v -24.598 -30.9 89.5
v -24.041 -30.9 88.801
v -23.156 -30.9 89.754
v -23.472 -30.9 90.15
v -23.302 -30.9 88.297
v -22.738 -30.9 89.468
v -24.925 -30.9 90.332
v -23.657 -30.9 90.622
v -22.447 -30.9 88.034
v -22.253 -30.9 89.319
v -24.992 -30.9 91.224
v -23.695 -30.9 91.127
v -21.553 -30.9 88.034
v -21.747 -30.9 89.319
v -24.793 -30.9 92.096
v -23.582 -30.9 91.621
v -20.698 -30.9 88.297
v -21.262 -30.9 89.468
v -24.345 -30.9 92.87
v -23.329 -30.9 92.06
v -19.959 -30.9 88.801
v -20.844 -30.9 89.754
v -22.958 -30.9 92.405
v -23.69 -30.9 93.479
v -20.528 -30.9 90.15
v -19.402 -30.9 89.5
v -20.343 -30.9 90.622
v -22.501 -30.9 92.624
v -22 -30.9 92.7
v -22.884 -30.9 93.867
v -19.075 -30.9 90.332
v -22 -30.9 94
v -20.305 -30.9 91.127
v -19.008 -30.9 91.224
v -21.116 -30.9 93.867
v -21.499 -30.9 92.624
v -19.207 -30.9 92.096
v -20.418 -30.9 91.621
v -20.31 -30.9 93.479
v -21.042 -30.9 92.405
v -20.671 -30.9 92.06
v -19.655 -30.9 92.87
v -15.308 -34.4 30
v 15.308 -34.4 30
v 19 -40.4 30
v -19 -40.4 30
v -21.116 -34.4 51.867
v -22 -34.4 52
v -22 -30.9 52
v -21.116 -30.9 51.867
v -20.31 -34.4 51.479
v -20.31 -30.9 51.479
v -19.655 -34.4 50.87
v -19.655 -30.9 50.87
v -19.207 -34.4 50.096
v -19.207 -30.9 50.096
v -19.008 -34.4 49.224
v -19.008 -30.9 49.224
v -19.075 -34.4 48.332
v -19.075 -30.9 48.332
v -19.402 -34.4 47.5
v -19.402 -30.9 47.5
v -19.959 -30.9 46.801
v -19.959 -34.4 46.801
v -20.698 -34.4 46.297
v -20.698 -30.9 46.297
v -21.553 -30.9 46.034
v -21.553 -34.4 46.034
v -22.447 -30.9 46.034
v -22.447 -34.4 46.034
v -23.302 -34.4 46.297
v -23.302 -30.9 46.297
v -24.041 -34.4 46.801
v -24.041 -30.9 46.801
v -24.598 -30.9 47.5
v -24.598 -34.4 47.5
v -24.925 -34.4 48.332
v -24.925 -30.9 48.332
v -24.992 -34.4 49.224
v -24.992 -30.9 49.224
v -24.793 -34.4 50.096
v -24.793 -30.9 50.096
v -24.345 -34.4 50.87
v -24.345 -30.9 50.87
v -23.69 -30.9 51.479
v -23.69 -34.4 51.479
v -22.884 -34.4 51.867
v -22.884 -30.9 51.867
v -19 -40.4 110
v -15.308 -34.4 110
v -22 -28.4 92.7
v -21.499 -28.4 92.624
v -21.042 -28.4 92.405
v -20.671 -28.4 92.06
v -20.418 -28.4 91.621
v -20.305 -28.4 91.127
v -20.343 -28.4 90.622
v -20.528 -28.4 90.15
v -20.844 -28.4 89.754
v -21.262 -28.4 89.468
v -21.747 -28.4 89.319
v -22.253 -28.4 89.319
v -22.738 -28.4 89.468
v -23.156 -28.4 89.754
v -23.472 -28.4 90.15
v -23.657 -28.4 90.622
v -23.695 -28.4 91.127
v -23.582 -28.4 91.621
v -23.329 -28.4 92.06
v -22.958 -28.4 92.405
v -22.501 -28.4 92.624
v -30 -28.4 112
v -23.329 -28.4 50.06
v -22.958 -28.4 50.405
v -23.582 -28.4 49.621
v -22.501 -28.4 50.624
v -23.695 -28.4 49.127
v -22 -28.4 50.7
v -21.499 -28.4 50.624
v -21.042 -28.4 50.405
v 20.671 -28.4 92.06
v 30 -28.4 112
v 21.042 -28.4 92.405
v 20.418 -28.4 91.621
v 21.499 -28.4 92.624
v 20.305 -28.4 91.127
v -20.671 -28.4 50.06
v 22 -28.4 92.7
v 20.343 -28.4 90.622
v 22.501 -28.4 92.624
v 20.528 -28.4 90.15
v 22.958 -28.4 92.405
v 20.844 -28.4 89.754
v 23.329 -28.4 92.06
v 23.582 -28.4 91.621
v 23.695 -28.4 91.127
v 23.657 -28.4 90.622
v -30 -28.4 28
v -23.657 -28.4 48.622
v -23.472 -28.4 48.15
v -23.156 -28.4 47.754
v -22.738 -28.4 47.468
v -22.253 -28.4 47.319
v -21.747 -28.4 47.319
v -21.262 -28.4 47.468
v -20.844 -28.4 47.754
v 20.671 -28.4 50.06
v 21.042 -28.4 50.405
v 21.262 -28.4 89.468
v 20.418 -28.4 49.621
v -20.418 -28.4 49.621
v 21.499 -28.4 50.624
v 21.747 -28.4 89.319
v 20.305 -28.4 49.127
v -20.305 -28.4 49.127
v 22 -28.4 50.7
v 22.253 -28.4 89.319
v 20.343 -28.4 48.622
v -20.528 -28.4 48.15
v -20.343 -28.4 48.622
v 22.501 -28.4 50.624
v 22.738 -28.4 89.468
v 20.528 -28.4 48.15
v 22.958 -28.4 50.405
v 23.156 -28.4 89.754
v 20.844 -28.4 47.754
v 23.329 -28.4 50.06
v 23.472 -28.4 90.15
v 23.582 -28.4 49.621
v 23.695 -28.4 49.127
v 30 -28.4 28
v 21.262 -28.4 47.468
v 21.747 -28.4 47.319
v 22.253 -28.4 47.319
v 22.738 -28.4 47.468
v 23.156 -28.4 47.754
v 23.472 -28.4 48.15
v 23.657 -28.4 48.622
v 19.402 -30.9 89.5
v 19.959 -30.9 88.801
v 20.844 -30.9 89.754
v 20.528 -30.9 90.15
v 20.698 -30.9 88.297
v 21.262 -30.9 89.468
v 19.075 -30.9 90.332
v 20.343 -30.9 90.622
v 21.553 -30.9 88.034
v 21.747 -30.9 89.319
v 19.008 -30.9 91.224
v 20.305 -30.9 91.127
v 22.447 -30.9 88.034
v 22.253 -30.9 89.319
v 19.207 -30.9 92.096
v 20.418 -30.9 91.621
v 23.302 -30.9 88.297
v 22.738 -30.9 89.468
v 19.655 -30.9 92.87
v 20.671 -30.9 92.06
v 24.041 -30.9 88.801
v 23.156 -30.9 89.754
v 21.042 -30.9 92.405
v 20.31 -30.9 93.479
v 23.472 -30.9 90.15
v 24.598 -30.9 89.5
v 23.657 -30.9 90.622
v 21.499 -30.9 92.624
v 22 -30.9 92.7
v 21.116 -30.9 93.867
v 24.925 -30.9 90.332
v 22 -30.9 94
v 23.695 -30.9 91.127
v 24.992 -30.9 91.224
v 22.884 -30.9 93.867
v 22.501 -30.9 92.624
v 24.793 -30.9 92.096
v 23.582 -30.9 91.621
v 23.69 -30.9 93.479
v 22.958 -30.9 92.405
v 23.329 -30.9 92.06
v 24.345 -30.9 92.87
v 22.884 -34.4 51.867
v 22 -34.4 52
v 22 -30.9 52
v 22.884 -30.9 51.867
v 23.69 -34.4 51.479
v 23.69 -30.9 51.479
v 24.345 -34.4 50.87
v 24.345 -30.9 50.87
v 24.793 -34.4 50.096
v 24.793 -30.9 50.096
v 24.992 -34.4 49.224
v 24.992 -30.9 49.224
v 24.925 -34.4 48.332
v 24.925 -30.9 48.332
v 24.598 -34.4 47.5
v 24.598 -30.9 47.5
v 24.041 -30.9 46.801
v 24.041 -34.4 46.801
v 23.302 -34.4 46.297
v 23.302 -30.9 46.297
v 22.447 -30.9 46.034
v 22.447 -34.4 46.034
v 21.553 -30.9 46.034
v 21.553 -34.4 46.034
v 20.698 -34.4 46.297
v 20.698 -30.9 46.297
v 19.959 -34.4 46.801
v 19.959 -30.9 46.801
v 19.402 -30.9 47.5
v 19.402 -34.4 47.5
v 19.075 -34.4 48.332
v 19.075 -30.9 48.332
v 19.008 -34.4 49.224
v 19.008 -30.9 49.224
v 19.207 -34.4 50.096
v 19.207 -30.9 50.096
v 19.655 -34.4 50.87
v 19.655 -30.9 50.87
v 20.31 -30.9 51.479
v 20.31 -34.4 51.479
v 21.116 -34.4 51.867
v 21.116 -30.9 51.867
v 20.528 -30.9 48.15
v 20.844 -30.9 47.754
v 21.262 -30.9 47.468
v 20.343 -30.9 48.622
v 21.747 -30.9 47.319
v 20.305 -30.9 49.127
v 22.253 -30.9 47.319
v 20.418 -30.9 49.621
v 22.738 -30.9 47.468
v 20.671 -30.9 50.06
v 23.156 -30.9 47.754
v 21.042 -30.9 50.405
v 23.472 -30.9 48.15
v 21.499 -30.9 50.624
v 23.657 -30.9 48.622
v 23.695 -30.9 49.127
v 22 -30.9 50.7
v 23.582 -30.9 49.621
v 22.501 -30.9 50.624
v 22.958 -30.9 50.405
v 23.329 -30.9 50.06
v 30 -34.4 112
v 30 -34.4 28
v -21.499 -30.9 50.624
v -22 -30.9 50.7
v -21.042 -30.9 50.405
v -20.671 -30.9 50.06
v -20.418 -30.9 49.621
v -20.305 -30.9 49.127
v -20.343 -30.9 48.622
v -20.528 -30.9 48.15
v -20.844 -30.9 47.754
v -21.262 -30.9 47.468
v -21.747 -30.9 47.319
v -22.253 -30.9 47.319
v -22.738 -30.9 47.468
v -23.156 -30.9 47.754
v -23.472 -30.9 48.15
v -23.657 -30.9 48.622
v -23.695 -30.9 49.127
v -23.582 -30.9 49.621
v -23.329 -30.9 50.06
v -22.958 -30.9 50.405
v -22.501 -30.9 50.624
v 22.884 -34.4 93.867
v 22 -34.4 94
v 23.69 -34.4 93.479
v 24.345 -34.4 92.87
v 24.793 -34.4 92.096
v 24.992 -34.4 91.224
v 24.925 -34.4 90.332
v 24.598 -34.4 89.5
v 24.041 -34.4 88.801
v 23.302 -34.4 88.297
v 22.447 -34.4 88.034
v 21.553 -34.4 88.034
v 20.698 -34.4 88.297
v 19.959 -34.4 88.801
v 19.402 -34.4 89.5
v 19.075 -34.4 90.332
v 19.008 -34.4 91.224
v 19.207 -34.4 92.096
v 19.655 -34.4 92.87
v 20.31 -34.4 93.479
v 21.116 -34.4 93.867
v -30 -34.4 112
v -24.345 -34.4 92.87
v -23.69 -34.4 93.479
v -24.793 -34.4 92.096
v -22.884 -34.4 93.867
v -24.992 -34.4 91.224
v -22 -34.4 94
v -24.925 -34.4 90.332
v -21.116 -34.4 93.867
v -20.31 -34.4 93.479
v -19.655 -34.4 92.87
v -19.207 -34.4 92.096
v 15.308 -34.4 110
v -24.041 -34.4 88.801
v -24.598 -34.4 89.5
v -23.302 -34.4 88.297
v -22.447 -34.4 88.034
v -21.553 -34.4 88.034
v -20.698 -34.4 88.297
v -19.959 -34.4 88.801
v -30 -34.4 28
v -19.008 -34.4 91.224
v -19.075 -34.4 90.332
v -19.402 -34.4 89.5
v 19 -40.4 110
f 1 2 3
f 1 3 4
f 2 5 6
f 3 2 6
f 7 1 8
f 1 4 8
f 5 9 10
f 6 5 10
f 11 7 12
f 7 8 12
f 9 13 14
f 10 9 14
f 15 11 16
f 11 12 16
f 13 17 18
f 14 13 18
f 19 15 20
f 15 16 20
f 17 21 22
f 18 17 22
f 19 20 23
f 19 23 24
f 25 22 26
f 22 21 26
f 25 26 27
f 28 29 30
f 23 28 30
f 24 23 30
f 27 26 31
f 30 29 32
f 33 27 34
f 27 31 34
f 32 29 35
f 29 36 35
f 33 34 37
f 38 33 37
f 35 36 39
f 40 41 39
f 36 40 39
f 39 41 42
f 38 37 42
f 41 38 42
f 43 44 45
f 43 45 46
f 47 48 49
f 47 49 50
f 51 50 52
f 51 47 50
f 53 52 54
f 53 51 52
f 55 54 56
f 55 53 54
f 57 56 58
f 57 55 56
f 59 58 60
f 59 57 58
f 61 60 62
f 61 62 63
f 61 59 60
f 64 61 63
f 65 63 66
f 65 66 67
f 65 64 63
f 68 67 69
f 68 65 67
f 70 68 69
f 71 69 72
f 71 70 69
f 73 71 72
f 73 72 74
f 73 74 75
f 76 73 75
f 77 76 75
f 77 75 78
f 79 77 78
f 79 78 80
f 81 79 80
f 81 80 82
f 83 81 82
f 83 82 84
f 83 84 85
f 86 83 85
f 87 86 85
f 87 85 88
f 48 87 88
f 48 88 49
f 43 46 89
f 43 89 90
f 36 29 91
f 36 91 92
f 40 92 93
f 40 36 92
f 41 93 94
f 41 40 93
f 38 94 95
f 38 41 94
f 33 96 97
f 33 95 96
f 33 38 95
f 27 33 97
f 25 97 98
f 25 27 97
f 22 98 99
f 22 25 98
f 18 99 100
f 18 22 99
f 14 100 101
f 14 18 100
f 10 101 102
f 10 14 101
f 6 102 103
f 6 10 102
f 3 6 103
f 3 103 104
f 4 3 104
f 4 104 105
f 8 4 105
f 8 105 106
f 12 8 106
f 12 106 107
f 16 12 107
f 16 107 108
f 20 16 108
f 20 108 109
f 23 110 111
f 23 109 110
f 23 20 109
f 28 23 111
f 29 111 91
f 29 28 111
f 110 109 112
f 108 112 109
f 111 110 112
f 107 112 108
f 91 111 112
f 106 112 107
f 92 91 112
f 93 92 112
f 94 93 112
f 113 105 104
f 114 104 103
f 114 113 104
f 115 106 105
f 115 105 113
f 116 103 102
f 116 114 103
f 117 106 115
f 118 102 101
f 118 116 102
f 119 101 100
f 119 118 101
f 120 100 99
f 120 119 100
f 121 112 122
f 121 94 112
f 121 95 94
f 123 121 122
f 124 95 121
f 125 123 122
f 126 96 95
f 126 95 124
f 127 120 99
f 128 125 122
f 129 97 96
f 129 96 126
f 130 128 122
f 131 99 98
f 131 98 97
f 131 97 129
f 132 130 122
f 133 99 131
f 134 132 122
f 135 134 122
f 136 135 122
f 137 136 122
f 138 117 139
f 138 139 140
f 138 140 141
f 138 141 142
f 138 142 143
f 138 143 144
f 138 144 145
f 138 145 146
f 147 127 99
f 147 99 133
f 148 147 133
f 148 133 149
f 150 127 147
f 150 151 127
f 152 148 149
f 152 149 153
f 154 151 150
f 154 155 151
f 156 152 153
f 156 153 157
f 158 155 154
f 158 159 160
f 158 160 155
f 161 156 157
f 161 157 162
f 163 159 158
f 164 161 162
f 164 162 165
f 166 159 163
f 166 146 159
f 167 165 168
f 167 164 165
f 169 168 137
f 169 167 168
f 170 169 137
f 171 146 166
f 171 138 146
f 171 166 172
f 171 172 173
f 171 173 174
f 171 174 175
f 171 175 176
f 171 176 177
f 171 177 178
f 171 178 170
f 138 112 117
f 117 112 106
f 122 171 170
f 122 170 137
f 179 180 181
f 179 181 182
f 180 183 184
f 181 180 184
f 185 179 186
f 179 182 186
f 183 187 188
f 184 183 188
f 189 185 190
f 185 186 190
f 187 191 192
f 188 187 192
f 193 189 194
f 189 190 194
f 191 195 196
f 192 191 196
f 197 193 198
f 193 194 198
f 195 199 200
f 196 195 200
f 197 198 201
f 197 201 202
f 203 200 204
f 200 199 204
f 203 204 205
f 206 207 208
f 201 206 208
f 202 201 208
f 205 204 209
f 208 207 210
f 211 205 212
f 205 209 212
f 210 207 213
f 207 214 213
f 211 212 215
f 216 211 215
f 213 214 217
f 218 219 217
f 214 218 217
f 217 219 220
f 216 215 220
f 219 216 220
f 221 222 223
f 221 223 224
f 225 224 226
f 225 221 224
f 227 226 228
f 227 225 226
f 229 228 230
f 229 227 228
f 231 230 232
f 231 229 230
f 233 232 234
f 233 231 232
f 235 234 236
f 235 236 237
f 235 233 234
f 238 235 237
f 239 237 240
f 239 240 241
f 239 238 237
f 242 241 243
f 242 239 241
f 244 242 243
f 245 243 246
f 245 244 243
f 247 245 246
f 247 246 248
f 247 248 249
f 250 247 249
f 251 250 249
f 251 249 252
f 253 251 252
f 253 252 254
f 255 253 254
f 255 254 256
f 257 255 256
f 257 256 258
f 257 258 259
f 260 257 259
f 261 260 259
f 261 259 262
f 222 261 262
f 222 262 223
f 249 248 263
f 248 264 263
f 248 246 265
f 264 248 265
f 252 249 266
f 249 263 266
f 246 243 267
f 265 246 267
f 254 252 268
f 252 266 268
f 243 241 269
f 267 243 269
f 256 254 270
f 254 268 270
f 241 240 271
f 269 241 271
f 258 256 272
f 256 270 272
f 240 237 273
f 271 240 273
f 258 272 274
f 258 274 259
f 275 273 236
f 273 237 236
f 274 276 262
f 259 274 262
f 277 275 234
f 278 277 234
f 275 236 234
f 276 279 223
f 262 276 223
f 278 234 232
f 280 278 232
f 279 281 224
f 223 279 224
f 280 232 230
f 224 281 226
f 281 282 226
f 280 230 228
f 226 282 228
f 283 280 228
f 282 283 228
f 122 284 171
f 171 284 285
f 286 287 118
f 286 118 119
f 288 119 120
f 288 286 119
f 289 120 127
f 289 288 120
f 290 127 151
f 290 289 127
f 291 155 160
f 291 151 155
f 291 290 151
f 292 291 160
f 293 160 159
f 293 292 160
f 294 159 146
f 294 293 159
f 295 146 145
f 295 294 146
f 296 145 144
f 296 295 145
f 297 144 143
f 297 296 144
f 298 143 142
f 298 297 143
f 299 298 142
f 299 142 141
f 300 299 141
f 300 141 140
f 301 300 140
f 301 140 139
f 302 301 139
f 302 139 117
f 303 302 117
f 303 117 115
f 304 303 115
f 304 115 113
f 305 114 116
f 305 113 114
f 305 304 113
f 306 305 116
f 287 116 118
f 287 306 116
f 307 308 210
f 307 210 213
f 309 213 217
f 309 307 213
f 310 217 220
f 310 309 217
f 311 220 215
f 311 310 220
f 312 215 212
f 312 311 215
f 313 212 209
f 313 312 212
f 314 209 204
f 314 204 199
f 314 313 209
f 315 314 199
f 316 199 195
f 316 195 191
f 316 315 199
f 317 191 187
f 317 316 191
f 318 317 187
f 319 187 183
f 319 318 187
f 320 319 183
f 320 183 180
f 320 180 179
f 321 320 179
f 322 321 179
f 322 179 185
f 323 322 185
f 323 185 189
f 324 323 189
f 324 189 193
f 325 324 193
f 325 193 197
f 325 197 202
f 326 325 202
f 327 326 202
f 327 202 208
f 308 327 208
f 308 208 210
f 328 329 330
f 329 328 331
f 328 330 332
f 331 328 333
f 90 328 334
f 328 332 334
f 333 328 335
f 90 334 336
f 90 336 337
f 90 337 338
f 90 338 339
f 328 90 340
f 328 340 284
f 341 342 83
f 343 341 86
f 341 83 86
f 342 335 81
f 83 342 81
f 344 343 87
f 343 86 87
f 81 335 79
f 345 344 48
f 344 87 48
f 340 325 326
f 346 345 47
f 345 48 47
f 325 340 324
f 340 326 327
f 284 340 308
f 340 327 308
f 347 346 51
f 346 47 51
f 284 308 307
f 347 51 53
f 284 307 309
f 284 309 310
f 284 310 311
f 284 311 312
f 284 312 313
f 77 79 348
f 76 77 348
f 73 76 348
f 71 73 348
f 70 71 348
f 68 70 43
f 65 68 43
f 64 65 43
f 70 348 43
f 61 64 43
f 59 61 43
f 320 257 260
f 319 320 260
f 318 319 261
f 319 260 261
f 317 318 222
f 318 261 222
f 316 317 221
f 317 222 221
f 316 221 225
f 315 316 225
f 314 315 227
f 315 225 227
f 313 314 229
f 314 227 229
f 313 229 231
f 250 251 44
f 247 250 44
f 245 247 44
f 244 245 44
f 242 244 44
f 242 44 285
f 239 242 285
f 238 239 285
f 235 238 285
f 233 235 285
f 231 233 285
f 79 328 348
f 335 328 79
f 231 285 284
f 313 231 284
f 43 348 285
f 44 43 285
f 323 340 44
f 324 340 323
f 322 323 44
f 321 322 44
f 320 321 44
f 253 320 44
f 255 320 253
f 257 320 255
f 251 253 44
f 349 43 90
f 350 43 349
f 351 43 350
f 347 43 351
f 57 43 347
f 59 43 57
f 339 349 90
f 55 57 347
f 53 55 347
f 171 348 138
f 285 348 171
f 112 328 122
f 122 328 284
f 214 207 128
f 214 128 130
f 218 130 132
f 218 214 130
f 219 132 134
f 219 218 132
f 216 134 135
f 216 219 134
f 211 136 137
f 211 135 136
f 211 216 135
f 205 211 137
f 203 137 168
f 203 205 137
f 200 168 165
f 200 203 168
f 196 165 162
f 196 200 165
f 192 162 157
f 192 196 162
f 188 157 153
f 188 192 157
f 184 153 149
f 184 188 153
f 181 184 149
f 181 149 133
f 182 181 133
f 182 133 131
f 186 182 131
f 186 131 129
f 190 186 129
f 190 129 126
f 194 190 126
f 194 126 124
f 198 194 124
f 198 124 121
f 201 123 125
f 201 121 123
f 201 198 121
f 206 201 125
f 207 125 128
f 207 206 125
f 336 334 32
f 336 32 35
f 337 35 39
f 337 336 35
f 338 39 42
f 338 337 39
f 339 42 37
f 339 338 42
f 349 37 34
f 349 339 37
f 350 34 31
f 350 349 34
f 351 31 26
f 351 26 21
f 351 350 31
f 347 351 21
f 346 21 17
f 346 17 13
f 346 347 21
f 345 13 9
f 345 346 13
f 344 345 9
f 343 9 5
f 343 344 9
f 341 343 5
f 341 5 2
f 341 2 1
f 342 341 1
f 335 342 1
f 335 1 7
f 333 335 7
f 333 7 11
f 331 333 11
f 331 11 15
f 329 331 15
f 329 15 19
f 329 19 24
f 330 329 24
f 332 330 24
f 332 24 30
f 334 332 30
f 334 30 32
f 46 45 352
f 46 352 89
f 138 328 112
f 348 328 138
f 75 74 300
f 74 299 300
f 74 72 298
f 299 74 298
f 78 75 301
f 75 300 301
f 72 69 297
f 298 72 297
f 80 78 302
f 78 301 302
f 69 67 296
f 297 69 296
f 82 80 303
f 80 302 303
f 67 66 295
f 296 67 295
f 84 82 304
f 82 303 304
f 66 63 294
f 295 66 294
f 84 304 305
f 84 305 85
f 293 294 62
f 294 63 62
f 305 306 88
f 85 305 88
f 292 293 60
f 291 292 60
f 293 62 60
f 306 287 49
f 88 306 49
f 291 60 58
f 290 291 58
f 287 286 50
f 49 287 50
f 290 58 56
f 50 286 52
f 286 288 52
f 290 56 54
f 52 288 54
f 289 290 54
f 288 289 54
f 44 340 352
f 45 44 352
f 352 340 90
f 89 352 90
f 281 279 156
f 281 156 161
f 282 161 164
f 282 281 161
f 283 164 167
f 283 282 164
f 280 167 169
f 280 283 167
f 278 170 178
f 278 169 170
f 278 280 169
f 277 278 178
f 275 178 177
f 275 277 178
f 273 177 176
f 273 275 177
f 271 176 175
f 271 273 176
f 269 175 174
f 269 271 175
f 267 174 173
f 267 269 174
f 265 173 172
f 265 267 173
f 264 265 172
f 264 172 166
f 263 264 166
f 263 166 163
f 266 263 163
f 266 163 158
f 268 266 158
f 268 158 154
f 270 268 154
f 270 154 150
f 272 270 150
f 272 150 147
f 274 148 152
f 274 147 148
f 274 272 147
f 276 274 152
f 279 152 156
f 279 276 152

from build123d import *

# Parameters (mm, degrees)
SKETCH1_W           = 60
SKETCH1_H           = 84
RAIL_PLATE_DEPTH    = 6
DOVETAIL_RAIL_DEPTH = 80
SKETCH3_R           = 1.7
M3_HOLES_DEPTH      = 7
SKETCH4_R           = 3
COUNTERBORES_DEPTH  = 4


with BuildPart() as part:
    # Sketch1 → Rail Plate (new body)
    with BuildSketch(Plane(origin=(0, -34.4, 0), x_dir=(1, 0, 0), z_dir=(0, 1, 0))):
        with Locations((0, -70)):
            Rectangle(SKETCH1_W, SKETCH1_H)
    extrude(amount=RAIL_PLATE_DEPTH)

    # Sketch2 → Dovetail Rail (add)
    with BuildSketch(Plane.XY.offset(30)):
        Polygon((-15, -33.9), (15, -33.9), (19, -40.4), (-19, -40.4), align=None)
    extrude(amount=DOVETAIL_RAIL_DEPTH)

    # Sketch3 → M3 Holes (cut)
    with BuildSketch(Plane(origin=(0, -34.9, 0), x_dir=(1, 0, 0), z_dir=(0, 1, 0))):
        with Locations(Location((-22, -91, 0), (0, 0, 270))):
            Circle(SKETCH3_R)
        with Locations(Location((-22, -49, 0), (0, 0, 270))):
            Circle(SKETCH3_R)
        with Locations(Location((22, -91, 0), (0, 0, 270))):
            Circle(SKETCH3_R)
        with Locations(Location((22, -49, 0), (0, 0, 270))):
            Circle(SKETCH3_R)
    extrude(amount=M3_HOLES_DEPTH, mode=Mode.SUBTRACT)

    # Sketch4 → Counterbores (cut)
    with BuildSketch(Plane(origin=(0, -34.9, 0), x_dir=(1, 0, 0), z_dir=(0, 1, 0))):
        with Locations(Location((-22, -91, 0), (0, 0, 270))):
            Circle(SKETCH4_R)
        with Locations(Location((-22, -49, 0), (0, 0, 270))):
            Circle(SKETCH4_R)
        with Locations(Location((22, -91, 0), (0, 0, 270))):
            Circle(SKETCH4_R)
        with Locations(Location((22, -49, 0), (0, 0, 270))):
            Circle(SKETCH4_R)
    extrude(amount=COUNTERBORES_DEPTH, mode=Mode.SUBTRACT)


solid = part.part
